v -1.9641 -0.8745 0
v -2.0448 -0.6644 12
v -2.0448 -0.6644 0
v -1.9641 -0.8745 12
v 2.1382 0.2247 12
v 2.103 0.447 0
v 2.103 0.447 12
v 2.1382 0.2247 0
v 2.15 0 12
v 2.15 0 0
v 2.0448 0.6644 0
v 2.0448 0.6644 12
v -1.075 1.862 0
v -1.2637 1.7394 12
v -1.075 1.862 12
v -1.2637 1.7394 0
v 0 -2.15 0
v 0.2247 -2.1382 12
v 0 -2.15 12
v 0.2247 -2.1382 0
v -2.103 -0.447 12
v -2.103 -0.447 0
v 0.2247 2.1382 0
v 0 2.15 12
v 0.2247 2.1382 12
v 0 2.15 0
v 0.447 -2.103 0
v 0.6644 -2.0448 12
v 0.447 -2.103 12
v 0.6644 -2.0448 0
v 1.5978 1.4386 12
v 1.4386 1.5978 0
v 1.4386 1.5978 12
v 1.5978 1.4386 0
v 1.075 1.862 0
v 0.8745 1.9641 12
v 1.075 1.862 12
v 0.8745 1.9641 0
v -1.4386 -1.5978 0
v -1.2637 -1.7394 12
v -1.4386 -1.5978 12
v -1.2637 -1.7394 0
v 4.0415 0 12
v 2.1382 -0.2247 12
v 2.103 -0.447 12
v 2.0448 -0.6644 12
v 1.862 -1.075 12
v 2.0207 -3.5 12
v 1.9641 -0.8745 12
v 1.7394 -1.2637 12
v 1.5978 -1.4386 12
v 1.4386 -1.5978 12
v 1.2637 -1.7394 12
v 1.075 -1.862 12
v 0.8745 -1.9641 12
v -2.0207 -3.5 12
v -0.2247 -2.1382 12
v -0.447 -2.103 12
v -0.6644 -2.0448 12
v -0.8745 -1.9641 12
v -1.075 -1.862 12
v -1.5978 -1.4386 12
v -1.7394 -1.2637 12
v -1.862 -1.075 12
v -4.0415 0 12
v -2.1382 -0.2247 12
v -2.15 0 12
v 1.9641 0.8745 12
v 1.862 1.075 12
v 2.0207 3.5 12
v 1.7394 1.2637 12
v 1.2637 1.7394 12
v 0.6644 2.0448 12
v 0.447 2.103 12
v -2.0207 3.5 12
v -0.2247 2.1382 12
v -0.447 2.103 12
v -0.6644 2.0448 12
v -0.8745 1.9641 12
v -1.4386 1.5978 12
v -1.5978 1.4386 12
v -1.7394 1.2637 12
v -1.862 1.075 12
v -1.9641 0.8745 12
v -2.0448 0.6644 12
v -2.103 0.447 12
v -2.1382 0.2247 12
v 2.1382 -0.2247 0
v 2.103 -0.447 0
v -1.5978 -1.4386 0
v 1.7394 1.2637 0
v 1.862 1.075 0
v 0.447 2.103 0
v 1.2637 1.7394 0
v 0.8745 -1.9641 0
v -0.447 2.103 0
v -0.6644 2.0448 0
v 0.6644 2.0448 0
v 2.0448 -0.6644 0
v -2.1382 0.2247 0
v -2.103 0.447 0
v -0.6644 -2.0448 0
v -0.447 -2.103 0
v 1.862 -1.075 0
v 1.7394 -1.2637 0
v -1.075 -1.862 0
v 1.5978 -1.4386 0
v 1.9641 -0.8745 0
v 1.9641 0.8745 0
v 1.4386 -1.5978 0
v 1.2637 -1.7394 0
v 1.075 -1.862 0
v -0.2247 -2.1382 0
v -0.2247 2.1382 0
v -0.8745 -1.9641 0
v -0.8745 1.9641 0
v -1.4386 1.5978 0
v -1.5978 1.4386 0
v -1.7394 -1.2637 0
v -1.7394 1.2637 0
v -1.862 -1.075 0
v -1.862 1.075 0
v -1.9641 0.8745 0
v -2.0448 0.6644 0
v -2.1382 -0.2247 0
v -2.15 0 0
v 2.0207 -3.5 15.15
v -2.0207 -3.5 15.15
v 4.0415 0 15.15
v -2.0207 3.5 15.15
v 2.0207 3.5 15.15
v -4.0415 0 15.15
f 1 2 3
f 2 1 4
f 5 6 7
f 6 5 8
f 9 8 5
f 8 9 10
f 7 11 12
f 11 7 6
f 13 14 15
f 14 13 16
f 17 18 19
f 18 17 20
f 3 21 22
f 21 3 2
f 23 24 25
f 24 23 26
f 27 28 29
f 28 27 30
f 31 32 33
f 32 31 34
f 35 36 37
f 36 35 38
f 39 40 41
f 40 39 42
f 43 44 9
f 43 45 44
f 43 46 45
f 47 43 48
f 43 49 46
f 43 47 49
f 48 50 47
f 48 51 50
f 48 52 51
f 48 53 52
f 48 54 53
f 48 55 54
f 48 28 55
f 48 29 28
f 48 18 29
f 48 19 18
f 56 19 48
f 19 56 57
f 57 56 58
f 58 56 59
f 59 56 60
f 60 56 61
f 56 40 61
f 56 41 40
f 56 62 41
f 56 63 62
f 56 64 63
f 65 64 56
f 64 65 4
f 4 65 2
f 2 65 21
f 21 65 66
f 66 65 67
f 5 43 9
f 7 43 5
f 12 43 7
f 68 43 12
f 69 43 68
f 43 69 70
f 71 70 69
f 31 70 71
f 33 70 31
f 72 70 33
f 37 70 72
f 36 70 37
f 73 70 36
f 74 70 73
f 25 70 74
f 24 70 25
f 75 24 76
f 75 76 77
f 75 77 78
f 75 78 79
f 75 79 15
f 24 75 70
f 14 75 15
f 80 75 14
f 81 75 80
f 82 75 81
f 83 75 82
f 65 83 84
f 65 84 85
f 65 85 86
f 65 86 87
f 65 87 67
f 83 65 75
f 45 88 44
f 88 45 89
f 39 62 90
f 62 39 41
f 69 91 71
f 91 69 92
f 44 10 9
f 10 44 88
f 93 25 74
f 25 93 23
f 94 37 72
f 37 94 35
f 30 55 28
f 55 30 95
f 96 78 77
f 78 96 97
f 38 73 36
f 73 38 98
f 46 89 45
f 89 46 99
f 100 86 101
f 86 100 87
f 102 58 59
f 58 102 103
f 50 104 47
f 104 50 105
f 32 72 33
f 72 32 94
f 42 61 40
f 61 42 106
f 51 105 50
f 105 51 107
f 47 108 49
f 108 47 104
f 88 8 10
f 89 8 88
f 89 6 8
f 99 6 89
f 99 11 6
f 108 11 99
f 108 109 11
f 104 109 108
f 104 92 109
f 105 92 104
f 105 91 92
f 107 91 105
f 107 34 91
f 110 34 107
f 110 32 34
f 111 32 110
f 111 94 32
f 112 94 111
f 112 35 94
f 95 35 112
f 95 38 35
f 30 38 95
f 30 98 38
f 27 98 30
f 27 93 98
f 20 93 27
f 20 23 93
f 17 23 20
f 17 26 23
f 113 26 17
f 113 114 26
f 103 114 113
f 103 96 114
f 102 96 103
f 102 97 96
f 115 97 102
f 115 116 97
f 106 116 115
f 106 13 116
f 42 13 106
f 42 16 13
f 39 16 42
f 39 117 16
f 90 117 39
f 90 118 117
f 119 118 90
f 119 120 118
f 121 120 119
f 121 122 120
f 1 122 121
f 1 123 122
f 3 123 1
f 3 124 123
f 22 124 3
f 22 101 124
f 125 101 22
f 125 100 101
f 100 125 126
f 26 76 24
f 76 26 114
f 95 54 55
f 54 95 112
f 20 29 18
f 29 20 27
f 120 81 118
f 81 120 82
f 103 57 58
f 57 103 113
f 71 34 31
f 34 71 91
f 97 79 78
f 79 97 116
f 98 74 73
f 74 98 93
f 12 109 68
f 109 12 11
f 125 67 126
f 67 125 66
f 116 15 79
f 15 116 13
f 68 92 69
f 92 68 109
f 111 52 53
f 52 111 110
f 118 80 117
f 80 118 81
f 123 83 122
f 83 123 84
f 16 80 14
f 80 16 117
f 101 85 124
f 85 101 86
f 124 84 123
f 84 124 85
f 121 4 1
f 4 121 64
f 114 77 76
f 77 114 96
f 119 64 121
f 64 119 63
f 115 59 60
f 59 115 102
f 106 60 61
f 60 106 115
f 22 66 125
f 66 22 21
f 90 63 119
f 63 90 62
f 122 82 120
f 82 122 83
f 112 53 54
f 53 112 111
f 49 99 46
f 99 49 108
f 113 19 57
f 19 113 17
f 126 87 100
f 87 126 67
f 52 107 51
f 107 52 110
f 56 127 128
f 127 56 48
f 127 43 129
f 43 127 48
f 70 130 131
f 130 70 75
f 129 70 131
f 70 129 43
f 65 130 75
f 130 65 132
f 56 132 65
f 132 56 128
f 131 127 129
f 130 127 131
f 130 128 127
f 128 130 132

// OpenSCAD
// Hex-head bolt.
$fn = 60;
eps = 0.02;
thread_d = 4.3;
flat = 7;
shaft_l = 12;
union() { cylinder(d=thread_d,h=shaft_l); translate([0,0,shaft_l]) cylinder(d=flat/cos(30),h=flat*0.45,$fn=6); }
